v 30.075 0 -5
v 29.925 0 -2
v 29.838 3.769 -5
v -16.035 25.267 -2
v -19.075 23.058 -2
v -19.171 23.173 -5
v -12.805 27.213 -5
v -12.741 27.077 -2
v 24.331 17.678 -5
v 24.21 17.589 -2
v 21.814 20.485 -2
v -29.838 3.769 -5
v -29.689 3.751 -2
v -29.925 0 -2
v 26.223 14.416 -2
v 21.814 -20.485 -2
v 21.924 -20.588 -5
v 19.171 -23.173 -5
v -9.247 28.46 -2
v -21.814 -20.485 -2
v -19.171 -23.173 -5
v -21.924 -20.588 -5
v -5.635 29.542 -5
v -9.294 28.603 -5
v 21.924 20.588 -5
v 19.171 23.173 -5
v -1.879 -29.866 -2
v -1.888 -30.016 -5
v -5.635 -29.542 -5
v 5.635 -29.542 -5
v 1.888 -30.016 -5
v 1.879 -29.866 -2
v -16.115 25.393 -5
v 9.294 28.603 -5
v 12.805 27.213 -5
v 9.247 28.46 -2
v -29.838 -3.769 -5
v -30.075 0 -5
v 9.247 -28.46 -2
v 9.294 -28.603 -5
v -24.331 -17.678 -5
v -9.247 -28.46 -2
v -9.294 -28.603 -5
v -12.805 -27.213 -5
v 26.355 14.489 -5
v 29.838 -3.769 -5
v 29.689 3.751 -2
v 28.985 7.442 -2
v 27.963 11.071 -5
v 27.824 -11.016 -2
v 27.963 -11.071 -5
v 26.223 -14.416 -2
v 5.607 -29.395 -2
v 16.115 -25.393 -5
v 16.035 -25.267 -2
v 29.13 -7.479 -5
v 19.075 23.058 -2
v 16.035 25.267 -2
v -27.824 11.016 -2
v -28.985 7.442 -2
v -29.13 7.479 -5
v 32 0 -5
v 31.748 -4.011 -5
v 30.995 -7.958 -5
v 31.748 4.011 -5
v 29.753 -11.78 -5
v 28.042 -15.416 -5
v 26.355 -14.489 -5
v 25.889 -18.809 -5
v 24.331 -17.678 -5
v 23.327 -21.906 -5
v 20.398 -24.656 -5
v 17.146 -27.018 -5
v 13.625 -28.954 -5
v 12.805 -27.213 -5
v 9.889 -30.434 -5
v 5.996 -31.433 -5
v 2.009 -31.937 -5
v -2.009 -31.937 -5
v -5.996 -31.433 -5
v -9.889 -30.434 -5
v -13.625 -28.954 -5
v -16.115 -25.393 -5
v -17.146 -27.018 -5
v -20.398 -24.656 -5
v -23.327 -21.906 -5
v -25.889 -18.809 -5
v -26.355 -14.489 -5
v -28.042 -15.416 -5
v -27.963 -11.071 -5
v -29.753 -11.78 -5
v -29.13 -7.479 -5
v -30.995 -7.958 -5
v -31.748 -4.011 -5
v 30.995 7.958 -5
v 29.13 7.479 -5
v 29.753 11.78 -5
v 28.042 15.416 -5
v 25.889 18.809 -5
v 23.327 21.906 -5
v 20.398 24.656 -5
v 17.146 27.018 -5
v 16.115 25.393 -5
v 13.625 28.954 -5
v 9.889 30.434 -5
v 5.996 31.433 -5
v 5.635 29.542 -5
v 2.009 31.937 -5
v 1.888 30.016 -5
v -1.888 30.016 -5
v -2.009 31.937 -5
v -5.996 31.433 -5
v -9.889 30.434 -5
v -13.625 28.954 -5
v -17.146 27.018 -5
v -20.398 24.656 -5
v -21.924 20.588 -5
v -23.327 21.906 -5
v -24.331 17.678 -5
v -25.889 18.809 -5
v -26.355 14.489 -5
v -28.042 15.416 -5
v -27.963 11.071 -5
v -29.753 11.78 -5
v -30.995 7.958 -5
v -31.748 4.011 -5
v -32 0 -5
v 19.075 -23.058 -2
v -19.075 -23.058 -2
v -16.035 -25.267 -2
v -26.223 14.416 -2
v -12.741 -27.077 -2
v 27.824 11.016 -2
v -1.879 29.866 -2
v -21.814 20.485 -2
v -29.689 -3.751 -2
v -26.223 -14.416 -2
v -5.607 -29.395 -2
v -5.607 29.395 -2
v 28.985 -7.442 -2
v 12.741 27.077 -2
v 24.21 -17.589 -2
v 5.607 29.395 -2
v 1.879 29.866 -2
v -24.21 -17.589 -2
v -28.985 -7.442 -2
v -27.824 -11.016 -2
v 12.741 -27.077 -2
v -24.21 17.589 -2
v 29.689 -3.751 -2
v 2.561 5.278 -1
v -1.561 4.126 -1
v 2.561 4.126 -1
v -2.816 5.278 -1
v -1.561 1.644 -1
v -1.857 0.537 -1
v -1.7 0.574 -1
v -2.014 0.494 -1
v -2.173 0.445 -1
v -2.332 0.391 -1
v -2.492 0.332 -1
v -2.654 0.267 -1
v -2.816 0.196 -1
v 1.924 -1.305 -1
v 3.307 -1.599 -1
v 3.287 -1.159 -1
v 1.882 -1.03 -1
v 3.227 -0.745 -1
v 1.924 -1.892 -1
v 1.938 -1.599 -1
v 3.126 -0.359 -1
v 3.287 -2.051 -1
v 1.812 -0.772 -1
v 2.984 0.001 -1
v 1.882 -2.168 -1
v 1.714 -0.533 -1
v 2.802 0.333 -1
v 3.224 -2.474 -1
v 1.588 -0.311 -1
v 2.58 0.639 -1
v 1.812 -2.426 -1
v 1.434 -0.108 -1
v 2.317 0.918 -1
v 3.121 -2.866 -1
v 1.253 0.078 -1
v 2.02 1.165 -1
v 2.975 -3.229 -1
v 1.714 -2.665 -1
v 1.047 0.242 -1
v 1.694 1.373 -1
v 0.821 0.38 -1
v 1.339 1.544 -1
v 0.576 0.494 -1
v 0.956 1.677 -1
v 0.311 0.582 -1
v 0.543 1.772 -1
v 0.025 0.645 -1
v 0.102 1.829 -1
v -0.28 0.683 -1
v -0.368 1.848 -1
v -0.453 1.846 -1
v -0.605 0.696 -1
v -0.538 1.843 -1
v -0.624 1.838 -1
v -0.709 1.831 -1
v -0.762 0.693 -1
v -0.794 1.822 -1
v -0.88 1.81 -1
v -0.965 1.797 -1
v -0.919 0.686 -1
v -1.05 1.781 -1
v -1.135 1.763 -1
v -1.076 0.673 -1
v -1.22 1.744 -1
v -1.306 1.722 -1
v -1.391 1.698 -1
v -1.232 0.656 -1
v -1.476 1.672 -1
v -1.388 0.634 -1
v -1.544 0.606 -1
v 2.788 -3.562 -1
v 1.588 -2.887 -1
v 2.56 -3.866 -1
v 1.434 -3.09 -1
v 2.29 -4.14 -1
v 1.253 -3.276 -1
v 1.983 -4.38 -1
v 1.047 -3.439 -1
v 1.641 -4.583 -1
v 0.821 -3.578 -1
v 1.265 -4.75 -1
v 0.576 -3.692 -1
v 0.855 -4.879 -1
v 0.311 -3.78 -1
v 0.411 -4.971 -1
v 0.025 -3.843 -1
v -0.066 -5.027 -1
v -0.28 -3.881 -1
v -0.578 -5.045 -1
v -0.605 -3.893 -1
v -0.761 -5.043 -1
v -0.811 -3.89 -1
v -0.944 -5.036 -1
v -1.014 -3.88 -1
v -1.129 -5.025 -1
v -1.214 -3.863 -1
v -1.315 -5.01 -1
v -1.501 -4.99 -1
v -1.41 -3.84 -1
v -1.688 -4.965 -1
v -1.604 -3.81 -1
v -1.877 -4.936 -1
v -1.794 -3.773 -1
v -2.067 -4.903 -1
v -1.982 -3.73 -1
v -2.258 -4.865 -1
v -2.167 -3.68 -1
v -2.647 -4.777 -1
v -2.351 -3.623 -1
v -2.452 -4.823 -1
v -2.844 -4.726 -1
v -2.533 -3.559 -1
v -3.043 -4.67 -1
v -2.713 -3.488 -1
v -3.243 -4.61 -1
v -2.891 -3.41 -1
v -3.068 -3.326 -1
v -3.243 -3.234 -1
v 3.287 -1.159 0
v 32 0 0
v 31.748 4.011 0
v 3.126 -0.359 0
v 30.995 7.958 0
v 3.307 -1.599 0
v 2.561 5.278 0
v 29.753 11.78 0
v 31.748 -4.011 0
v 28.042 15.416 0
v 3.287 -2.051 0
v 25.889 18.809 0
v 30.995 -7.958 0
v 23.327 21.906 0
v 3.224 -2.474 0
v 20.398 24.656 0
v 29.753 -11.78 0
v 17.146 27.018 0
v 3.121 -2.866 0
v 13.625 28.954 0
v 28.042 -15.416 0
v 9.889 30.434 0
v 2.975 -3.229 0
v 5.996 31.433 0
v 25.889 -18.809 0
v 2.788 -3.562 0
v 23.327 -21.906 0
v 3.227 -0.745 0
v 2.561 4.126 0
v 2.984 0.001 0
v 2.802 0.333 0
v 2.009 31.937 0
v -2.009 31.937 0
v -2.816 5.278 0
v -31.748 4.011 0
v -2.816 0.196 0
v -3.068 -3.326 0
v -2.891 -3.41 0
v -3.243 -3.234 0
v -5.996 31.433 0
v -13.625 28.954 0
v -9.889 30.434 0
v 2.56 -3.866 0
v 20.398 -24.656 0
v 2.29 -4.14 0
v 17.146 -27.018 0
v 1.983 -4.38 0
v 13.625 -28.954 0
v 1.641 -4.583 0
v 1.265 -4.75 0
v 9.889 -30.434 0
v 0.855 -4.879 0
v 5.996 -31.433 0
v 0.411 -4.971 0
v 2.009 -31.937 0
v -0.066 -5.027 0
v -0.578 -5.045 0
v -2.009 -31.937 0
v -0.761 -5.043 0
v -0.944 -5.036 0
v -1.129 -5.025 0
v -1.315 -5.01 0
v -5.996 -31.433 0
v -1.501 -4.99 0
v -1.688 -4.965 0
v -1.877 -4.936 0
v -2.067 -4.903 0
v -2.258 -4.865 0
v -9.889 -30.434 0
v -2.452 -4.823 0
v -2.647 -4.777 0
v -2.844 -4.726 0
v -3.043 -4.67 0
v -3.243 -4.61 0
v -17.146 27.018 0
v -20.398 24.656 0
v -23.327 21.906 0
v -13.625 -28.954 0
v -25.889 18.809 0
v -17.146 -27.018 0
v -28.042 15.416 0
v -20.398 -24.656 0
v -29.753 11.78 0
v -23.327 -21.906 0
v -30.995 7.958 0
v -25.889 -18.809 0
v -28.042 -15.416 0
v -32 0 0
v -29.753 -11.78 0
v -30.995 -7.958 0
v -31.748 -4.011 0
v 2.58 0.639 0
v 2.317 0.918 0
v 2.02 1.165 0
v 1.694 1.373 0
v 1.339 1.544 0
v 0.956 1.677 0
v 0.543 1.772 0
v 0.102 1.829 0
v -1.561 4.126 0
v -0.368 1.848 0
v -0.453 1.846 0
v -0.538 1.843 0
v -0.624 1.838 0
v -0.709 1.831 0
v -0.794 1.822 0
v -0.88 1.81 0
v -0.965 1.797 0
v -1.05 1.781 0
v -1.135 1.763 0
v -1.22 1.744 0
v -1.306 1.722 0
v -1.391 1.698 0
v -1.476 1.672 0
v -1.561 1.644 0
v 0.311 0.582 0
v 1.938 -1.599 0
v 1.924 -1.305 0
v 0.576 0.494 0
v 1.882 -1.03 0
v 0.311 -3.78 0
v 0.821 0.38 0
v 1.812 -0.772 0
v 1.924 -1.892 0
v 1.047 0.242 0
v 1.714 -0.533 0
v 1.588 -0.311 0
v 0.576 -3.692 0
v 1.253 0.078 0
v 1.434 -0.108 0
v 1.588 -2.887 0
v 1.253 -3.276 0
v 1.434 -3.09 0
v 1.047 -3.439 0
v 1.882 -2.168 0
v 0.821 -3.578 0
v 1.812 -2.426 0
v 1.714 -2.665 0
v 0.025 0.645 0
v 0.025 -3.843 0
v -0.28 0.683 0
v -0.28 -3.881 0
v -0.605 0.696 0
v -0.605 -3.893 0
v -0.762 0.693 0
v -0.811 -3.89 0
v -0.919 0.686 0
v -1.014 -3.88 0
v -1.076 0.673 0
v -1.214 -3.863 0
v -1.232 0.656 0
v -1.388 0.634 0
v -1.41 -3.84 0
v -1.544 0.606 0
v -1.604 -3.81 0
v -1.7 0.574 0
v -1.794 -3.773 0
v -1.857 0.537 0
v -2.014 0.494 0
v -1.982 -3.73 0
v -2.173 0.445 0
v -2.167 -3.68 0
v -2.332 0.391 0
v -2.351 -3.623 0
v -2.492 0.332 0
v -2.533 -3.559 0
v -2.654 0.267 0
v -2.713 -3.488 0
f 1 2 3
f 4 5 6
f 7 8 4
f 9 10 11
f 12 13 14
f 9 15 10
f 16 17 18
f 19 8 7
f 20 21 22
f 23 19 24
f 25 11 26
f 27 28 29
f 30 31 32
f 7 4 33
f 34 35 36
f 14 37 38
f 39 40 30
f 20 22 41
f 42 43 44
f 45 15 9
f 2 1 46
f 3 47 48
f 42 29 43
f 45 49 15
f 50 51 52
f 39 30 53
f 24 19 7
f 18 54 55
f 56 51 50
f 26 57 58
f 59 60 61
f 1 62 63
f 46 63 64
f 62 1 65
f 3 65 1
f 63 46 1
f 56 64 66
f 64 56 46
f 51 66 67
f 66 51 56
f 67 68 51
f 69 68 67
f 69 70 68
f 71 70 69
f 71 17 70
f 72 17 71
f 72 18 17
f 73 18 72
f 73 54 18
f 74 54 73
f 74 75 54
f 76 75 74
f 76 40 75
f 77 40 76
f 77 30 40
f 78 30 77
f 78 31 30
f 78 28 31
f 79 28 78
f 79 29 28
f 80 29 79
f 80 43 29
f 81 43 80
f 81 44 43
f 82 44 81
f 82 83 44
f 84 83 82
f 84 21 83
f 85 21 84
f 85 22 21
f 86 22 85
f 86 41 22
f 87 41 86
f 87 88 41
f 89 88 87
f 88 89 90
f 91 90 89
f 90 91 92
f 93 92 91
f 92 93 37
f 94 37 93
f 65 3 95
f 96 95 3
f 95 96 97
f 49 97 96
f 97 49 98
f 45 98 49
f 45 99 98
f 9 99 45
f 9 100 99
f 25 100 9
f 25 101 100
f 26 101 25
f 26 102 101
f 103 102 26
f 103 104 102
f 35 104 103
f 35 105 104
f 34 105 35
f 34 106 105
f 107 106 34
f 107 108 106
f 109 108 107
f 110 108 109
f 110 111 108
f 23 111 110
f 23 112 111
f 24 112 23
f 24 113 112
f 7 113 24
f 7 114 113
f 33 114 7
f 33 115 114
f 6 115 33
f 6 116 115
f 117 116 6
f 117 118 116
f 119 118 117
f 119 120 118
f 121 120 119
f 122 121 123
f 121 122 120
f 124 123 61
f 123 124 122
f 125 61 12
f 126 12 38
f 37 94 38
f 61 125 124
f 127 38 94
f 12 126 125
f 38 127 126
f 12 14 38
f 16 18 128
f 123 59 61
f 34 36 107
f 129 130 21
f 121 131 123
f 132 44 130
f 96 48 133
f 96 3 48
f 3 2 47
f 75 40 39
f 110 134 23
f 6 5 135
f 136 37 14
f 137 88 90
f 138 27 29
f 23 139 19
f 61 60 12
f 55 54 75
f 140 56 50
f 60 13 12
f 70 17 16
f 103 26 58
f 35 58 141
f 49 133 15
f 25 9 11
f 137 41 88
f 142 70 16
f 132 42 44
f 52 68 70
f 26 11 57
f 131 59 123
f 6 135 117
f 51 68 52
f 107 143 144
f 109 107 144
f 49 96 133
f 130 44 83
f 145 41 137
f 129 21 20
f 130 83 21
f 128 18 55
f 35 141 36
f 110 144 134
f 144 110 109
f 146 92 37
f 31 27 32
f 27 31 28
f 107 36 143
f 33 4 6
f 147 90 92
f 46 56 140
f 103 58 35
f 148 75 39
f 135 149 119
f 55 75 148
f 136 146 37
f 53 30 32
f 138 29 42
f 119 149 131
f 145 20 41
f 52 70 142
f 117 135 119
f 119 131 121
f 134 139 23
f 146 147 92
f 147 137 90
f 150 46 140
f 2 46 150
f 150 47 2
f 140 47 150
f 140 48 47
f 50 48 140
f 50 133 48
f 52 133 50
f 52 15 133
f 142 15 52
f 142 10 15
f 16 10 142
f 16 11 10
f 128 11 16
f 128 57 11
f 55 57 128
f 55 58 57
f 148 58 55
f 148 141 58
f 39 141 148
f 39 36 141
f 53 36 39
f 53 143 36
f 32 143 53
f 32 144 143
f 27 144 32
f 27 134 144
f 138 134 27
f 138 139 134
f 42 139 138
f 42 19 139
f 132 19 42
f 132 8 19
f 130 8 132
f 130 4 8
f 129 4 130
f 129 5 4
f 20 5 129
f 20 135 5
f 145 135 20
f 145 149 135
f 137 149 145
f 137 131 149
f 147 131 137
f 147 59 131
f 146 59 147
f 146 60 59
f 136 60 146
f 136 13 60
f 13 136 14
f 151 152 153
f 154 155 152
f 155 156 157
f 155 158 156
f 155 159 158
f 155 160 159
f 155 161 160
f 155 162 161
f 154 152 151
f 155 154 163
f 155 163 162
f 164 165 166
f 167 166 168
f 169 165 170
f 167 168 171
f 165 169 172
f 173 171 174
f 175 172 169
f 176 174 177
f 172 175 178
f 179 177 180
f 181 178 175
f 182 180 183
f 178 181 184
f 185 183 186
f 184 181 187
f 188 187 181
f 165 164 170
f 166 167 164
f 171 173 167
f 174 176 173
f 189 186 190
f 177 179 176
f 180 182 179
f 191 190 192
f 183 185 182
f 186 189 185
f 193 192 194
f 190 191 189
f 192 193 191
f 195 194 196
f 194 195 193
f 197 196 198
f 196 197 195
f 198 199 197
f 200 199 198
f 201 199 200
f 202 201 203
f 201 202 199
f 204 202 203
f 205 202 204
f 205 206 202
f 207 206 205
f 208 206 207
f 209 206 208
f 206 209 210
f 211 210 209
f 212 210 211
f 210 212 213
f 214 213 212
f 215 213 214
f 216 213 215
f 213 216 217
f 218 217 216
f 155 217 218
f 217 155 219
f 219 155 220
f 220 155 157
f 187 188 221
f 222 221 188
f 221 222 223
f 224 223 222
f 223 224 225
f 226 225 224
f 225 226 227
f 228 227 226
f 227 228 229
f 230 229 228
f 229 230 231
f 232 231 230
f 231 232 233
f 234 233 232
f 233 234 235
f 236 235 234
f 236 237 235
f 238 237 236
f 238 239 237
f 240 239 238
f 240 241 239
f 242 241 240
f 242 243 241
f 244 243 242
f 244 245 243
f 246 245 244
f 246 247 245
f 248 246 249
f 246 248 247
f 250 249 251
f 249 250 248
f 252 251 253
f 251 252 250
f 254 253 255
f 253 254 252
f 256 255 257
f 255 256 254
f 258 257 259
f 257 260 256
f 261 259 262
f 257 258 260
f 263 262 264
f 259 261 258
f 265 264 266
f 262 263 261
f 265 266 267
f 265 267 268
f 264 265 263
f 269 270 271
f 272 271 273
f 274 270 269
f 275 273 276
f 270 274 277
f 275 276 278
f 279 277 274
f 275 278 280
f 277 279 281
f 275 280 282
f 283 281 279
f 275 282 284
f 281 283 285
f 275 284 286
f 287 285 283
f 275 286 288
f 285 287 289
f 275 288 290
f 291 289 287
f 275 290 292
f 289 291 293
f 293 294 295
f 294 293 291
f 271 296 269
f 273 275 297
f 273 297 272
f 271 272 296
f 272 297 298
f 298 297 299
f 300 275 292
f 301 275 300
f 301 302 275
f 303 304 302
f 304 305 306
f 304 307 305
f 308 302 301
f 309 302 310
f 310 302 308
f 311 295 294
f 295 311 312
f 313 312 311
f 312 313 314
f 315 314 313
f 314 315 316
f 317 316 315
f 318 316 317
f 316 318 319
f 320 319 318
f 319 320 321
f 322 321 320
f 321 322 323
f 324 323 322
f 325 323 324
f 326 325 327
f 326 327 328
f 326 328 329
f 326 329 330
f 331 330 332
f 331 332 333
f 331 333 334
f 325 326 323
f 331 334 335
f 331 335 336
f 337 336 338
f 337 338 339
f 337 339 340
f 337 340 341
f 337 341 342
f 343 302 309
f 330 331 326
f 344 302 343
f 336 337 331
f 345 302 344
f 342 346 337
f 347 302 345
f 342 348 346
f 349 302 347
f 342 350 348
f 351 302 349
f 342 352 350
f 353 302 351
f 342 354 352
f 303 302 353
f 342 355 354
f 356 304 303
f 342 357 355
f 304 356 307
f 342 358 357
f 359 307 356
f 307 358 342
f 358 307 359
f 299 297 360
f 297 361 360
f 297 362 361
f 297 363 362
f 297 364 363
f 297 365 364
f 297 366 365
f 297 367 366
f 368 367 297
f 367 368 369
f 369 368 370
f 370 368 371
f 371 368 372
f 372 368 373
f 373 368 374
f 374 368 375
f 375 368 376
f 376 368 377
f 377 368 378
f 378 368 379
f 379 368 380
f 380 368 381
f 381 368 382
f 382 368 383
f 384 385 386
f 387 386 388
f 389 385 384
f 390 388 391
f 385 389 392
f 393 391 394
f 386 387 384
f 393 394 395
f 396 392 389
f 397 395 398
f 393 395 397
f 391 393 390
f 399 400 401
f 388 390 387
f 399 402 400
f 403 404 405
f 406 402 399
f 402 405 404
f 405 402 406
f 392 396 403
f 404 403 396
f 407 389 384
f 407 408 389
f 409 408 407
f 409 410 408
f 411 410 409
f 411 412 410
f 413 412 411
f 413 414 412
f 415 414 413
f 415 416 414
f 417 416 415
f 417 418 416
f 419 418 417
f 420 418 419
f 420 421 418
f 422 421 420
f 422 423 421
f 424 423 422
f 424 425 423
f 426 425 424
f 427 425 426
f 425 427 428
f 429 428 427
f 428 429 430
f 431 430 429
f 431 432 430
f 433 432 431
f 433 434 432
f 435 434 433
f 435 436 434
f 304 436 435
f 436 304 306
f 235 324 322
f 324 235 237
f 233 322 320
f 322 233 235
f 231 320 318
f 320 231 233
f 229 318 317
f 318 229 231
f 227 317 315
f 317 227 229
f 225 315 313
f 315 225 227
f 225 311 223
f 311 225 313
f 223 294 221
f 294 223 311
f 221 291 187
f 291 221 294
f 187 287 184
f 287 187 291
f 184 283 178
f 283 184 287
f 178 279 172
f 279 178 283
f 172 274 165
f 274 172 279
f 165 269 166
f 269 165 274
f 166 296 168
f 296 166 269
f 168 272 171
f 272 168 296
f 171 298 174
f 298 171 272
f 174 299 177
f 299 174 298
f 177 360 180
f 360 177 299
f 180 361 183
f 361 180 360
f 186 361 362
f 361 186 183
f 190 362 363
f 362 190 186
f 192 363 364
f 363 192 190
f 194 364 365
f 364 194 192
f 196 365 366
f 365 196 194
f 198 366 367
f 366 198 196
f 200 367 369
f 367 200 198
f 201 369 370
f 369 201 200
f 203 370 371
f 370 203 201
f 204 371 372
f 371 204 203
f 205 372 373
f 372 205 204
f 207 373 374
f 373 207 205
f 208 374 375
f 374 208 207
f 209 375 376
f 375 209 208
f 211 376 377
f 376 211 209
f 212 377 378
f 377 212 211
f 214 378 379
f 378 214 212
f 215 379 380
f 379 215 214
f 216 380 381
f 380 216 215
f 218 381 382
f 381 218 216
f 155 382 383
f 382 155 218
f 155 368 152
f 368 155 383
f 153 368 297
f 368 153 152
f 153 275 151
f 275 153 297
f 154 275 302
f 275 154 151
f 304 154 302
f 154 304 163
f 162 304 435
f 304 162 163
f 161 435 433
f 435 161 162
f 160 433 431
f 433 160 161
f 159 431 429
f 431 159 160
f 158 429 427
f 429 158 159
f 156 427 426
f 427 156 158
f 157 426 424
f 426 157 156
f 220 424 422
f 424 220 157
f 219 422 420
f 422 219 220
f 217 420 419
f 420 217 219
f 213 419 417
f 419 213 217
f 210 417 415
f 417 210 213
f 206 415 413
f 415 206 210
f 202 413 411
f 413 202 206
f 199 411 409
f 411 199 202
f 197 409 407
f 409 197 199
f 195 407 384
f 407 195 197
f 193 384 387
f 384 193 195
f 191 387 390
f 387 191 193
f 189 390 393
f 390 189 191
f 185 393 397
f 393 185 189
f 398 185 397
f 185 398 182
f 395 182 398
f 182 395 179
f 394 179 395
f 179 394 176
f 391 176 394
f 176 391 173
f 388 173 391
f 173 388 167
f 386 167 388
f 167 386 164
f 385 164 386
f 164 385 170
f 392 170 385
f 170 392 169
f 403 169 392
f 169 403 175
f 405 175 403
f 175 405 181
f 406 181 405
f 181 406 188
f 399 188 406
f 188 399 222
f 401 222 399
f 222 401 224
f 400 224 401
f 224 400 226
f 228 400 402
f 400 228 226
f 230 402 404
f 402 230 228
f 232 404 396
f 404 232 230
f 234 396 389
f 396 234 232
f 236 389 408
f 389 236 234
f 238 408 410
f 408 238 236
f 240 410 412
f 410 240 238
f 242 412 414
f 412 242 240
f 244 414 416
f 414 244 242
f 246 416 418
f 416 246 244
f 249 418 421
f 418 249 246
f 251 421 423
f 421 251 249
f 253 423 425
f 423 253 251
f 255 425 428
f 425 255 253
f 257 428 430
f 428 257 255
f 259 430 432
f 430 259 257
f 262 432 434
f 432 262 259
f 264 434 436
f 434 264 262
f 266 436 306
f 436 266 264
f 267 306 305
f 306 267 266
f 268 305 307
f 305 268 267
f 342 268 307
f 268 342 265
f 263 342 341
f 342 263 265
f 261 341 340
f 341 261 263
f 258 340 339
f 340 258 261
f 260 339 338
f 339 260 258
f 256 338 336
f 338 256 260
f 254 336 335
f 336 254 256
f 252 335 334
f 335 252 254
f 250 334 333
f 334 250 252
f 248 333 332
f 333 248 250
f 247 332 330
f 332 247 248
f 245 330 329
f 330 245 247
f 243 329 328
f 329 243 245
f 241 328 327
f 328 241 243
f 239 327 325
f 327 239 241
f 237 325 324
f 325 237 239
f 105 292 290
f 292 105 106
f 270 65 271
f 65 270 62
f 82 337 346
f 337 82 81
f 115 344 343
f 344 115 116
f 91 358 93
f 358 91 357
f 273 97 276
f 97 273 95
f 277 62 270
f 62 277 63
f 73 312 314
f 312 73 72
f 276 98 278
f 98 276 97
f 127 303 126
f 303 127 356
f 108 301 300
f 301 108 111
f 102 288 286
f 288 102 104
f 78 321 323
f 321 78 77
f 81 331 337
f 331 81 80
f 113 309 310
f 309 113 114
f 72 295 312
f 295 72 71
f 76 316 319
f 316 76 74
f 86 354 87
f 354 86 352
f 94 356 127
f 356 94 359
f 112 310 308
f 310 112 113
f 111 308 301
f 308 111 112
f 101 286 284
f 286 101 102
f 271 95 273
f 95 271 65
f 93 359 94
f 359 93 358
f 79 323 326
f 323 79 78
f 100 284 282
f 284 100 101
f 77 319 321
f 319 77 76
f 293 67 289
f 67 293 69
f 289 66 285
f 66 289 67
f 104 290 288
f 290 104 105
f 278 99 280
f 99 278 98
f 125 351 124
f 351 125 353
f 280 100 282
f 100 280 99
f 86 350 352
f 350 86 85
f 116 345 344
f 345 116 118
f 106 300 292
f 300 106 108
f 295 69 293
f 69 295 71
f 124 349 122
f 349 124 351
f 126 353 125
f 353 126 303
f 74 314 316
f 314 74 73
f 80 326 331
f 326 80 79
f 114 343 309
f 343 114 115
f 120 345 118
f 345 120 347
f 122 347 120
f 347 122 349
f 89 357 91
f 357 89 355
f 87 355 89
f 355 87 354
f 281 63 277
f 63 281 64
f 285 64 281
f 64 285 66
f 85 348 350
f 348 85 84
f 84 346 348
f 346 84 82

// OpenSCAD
$fn = 50;

difference() {
	union() {
		translate(v = [0, 0, -5.0]) {
			cylinder(h = 5, r = 32.0);
		}
	}
	union() {
		#translate(v = [0, 0, -5.0]) {
			cylinder(h = 3, r1 = 30.075, r2 = 29.925);
		}
		translate(v = [0, 0, -1]) {
			linear_extrude(height = 1) {
				text(font = "Impact", halign = "center", size = 10, text = "5", valign = "center");
			}
		}
	}
}
